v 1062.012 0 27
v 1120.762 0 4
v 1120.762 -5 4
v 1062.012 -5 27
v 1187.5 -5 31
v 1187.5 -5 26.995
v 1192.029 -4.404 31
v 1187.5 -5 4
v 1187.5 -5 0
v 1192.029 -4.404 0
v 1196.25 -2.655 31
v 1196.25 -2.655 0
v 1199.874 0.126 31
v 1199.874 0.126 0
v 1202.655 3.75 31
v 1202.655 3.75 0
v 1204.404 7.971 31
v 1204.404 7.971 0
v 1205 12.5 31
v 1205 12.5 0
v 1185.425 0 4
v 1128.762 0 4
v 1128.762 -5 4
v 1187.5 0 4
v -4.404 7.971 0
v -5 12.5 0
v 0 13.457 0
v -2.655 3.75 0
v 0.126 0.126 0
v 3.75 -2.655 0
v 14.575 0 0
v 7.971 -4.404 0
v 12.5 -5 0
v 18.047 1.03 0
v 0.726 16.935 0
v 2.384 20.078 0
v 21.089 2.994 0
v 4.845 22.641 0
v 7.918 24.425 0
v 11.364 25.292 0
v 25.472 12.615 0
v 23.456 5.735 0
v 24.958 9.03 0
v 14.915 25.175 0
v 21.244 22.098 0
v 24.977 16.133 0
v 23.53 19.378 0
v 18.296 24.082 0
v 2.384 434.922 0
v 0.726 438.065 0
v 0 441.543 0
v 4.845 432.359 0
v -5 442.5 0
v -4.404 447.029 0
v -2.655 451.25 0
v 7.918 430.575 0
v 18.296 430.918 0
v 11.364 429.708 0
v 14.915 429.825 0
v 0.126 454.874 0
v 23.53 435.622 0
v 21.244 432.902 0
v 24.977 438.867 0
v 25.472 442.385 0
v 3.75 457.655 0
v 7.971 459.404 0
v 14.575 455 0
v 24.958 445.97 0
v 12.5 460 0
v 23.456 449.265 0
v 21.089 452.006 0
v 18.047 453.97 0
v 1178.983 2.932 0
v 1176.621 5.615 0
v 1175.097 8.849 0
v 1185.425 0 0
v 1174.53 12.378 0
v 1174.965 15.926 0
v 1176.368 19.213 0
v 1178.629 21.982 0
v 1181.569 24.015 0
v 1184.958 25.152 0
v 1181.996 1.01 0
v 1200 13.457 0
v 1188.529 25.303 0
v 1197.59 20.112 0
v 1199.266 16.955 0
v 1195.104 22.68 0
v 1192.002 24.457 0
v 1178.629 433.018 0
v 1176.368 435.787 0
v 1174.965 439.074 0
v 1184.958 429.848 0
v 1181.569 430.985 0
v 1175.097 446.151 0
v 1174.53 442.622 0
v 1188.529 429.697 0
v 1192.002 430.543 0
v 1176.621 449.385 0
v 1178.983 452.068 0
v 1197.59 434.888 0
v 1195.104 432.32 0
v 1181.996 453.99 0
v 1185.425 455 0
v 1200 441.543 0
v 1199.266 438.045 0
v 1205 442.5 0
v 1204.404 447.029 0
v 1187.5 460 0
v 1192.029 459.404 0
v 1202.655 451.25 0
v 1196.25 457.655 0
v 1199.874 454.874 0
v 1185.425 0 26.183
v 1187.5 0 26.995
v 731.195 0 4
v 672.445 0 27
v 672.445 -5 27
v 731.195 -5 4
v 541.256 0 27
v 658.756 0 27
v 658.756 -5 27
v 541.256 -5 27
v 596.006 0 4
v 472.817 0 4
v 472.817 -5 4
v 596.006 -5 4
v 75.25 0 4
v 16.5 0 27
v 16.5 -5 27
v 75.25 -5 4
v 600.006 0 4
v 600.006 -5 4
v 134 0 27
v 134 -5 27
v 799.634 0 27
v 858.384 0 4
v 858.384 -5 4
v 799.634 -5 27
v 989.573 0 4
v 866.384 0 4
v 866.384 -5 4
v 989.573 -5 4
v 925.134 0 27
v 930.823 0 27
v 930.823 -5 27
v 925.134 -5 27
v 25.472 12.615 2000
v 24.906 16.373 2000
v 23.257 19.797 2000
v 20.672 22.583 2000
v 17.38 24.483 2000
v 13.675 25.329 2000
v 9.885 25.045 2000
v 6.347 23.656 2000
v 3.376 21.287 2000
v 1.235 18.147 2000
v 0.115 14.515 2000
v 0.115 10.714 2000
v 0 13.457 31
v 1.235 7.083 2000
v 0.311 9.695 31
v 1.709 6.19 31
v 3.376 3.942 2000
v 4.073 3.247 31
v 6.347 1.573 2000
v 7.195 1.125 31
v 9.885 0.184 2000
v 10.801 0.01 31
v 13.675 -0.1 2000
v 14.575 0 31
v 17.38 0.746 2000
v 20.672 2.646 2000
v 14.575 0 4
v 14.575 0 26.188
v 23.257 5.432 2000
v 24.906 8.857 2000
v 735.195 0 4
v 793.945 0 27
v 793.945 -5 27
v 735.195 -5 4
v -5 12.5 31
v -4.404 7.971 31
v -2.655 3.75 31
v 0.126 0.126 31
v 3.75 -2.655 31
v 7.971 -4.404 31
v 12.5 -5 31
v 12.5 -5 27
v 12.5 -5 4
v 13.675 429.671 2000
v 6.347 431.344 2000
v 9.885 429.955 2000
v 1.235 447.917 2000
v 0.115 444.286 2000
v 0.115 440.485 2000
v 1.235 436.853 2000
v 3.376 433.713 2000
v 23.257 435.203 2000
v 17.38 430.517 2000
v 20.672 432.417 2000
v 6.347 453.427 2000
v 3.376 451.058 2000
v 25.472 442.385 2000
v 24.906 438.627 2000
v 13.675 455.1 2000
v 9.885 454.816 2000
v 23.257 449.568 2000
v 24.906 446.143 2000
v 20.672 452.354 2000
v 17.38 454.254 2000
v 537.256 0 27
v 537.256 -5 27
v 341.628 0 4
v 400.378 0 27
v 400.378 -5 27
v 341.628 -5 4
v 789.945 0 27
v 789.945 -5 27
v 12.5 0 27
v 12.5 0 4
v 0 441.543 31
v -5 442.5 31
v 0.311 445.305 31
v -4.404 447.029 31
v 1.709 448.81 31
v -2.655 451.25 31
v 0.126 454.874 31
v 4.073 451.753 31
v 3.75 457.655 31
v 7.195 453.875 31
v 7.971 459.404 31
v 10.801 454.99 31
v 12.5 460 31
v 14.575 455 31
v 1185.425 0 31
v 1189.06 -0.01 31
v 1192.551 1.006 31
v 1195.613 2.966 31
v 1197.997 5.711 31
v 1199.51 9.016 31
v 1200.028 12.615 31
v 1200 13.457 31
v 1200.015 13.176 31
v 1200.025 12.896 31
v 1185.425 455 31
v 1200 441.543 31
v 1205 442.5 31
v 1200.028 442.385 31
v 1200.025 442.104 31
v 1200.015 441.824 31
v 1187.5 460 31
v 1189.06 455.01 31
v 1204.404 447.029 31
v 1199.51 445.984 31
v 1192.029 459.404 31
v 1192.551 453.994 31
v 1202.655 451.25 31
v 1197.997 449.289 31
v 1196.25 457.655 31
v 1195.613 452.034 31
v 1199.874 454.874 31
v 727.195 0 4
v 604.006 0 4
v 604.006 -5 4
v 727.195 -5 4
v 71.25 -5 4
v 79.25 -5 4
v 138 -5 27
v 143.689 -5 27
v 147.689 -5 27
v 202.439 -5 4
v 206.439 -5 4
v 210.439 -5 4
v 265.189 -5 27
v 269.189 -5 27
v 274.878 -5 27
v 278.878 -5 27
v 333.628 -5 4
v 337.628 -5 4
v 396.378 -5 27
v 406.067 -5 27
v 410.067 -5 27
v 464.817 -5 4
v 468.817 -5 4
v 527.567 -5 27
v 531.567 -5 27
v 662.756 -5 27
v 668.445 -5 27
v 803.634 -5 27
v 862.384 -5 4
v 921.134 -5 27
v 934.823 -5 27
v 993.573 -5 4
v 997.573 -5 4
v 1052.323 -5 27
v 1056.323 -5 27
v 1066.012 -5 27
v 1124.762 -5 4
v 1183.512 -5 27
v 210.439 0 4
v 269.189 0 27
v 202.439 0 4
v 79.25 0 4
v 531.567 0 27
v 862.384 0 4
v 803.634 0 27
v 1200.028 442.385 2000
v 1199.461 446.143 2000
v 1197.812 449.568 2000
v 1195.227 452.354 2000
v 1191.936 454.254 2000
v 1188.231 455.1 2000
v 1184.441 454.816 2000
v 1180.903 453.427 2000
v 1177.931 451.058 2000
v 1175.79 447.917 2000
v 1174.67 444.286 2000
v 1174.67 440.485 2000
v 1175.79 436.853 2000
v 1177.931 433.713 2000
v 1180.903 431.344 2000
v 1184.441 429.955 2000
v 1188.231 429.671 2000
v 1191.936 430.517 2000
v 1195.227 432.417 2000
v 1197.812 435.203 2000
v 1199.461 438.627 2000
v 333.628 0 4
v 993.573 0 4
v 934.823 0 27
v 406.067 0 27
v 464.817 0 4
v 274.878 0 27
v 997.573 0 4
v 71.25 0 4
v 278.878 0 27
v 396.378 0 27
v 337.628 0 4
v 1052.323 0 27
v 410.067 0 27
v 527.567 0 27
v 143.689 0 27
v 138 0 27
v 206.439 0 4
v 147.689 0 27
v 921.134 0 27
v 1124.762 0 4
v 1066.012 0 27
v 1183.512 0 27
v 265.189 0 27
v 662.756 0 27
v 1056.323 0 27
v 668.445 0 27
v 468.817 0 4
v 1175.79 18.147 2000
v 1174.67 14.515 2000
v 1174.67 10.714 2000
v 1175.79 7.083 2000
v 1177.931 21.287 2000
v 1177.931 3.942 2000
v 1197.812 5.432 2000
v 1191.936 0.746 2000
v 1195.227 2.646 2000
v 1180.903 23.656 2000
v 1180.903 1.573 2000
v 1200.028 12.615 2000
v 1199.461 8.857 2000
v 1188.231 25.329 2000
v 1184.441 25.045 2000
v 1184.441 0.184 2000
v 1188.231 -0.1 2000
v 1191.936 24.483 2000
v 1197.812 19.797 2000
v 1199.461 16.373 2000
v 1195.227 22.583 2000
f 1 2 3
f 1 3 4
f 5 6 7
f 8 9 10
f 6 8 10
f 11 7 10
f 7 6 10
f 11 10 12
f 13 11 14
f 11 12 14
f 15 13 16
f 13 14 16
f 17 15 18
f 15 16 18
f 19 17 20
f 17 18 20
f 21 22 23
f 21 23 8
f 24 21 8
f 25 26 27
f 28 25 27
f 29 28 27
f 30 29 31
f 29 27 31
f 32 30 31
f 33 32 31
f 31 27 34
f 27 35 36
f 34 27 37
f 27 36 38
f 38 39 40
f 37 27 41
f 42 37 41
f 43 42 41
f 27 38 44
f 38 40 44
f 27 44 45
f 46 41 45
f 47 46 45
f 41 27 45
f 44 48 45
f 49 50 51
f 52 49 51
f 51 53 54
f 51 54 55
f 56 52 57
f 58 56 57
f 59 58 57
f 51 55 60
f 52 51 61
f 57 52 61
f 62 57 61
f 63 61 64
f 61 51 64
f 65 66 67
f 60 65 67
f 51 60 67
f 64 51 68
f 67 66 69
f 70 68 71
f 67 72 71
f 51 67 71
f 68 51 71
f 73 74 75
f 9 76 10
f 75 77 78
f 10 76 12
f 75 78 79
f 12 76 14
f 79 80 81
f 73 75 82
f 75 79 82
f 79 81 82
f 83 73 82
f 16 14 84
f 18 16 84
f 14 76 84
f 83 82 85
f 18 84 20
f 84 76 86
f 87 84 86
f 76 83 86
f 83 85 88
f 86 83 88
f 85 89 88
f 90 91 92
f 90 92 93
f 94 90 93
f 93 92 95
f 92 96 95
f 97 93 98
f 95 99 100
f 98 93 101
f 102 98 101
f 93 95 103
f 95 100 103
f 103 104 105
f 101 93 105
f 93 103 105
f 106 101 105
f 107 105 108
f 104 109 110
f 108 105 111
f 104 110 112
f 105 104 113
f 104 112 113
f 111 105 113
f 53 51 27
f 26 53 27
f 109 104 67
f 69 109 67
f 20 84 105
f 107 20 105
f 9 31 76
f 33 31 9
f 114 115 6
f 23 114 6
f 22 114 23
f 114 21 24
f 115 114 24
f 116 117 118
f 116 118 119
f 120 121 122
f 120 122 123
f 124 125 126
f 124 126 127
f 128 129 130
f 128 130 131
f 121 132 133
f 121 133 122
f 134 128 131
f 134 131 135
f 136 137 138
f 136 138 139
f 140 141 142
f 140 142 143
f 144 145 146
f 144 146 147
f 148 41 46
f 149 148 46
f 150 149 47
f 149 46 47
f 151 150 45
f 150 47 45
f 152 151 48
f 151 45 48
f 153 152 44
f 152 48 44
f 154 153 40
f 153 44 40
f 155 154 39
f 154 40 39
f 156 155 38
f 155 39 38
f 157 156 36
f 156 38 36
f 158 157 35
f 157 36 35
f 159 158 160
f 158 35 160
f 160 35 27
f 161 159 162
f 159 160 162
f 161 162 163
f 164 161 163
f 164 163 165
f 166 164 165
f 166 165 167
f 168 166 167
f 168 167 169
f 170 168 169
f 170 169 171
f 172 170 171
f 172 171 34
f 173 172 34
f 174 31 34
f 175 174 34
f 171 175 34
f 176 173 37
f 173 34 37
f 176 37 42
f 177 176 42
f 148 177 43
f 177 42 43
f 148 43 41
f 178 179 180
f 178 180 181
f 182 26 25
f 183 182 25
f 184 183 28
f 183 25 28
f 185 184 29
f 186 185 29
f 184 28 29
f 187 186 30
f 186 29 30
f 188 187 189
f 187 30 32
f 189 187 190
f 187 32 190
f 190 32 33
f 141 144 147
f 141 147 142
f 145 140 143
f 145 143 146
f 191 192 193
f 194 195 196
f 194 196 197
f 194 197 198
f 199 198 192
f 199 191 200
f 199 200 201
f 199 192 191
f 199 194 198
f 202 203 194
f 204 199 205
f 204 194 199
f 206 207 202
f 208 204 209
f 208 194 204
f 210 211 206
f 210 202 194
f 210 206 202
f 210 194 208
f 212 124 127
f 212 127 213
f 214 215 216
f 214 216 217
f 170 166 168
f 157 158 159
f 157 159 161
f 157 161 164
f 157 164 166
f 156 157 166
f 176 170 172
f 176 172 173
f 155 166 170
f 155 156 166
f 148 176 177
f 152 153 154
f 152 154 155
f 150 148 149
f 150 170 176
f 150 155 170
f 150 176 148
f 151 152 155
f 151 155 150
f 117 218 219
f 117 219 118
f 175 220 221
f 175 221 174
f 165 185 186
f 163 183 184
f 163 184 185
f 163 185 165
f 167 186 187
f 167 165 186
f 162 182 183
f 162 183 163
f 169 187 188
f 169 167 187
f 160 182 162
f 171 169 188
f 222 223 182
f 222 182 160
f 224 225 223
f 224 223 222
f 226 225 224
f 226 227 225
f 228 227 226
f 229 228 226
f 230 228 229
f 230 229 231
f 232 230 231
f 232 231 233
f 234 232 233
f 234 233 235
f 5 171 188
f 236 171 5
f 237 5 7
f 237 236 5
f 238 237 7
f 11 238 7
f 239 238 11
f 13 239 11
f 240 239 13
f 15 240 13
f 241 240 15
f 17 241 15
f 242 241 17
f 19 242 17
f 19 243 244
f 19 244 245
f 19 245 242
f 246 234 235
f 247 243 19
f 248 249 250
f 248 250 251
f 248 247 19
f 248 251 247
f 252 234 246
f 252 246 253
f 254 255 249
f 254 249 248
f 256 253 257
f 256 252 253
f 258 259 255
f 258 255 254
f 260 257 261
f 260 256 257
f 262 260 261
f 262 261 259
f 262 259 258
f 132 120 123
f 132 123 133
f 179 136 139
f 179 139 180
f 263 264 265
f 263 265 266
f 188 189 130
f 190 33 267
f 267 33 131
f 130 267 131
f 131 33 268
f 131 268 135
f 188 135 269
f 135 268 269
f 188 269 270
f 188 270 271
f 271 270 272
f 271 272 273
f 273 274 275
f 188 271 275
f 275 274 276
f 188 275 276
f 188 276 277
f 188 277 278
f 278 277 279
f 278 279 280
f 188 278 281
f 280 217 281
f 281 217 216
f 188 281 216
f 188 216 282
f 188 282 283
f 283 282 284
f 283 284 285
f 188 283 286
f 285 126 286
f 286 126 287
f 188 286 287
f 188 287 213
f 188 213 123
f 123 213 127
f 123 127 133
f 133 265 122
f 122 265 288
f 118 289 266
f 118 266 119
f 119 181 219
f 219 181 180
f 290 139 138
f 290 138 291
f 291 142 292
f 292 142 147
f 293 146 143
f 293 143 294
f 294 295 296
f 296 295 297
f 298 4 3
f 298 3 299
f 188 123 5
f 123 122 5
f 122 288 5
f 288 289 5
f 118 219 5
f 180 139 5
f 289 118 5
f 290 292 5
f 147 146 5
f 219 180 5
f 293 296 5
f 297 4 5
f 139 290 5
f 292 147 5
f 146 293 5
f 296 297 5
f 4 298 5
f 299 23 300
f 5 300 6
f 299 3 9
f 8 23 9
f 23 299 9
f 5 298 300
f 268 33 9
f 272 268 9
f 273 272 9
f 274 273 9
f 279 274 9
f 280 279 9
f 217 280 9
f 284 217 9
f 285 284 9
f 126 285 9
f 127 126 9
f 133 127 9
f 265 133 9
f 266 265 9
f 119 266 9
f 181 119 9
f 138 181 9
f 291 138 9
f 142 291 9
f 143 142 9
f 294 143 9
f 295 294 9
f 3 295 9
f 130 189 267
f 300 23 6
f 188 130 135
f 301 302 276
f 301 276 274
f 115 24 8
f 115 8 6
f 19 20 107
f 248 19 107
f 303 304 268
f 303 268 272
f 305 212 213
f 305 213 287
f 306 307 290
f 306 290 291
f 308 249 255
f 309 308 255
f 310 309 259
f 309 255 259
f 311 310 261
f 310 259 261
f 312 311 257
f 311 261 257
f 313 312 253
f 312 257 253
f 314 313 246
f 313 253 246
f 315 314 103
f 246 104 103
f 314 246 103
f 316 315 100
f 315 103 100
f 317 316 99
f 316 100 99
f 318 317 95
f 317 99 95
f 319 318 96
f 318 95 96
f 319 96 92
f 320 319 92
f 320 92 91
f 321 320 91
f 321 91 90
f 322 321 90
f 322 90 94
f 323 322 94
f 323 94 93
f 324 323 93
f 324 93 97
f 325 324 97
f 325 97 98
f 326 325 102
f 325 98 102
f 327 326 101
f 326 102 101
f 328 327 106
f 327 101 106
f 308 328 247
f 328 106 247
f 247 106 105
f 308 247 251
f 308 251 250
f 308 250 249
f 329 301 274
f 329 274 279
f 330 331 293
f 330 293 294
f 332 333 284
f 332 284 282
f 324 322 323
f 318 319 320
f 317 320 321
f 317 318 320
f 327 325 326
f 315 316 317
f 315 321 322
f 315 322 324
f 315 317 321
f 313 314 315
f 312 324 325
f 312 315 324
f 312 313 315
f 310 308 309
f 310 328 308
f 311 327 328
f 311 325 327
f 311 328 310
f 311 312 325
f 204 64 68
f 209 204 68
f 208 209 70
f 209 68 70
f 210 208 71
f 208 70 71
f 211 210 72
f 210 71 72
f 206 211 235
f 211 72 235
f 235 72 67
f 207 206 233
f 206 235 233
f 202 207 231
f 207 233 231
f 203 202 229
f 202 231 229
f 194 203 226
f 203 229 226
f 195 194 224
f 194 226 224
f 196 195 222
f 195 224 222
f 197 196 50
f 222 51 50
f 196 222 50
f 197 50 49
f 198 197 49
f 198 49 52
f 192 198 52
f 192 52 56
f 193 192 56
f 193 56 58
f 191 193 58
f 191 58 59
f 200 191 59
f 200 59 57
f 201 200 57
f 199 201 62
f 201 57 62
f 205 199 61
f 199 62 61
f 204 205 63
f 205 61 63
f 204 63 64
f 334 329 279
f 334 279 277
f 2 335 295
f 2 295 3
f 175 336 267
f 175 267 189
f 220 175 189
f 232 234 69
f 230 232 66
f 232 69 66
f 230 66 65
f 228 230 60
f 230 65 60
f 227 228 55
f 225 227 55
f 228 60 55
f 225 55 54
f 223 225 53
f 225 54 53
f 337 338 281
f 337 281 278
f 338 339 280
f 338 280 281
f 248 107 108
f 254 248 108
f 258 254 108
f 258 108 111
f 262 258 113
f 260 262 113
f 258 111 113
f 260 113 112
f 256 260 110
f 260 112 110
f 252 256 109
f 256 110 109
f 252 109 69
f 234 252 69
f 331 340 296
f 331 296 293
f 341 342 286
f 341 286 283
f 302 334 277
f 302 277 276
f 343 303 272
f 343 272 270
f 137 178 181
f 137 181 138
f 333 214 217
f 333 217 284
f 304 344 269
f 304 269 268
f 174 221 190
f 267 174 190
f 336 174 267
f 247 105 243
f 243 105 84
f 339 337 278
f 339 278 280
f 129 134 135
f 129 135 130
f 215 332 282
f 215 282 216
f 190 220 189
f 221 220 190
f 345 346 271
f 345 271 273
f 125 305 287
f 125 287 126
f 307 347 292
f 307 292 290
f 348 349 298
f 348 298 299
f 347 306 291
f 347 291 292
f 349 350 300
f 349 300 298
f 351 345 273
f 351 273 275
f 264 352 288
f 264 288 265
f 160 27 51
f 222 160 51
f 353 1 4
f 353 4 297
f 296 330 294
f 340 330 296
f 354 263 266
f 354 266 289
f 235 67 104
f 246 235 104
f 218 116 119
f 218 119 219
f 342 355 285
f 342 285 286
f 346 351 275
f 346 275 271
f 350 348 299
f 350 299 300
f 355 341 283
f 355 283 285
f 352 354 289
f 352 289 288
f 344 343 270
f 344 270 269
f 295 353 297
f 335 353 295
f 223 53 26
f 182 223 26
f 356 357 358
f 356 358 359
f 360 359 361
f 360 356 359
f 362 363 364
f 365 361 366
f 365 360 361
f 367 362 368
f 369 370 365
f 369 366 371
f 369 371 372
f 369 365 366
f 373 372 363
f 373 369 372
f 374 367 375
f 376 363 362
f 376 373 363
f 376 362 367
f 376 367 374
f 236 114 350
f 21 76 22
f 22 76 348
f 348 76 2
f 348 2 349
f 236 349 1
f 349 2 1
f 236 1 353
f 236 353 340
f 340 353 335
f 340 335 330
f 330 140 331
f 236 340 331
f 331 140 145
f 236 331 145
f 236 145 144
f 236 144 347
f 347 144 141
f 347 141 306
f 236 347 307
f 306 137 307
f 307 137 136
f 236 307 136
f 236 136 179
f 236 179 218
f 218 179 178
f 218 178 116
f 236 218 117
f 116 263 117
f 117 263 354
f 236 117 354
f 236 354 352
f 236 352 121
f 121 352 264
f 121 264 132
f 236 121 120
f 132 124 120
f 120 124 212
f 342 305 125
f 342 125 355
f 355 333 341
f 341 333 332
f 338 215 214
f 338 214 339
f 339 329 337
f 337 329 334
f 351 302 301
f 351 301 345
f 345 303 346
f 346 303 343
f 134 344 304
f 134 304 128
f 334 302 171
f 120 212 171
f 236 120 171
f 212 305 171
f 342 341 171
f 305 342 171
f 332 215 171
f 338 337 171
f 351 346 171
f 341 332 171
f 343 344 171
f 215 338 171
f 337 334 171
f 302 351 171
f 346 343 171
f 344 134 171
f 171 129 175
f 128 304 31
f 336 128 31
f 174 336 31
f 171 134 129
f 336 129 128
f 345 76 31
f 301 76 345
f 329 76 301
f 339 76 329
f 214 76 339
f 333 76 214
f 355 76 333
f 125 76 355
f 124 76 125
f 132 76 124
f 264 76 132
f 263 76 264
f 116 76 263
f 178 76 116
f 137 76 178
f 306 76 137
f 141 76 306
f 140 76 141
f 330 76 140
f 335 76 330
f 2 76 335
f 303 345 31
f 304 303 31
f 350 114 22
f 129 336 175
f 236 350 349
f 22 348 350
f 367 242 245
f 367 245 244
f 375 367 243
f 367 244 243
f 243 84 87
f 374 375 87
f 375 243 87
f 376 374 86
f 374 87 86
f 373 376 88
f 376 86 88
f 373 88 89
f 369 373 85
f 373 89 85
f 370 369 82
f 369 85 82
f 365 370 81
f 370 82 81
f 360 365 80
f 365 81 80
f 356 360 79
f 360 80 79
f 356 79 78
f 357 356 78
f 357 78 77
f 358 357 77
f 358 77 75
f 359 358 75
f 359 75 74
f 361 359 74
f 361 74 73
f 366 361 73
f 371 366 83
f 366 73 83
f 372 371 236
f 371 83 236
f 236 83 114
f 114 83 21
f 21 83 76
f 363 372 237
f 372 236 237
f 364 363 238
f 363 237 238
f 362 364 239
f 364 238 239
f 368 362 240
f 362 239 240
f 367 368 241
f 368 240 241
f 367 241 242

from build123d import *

# Parameters (mm, degrees)
F1_DEPTH = 31
F2_R     = 12.75
F3_DEPTH = 2000
F5_DEPTH = 25


# Not quite as in the source:
# - ends of sketch curves that miss each other by under 0.0002 mm in the source are joined


with BuildPart() as f1:
    # F0 (on Top) → F1 (new body)
    with BuildSketch(Plane.XY):
        with BuildLine():
            Line((-4.9999998882, 442.5), (-4.9999998882, 12.5))
            ThreePointArc((-4.9999998882, 12.5), (0.1256313292, 0.1256313292), (12.5, -5))
            Line((12.5, -5), (1187.5, -5))
            ThreePointArc((1187.5, -5), (1199.8743686708, 0.1256313292), (1205, 12.5))
            Line((1205, 12.5), (1205, 442.5))
            ThreePointArc((1205, 442.5), (1199.8743686708, 454.8743686708), (1187.5, 460))
            Line((1187.5, 460), (12.5, 460.0000083447))
            ThreePointArc((12.5, 460.0000083447), (0.1256313292, 454.8743686708), (-4.9999998882, 442.5))
        make_face()
        with BuildLine():
            Line((1187.5, 0), (12.5, 0))
            ThreePointArc((12.5, 0), (3.6611652352, 3.6611652352), (0, 12.5))
            Line((0, 12.5), (0, 442.5))
            ThreePointArc((0, 442.5), (3.6611652352, 451.3388347648), (12.5, 455))
            Line((12.5, 455), (1187.5, 455))
            ThreePointArc((1187.5, 455), (1196.3388347648, 451.3388347648), (1200, 442.5))
            Line((1200, 442.5), (1200, 12.5))
            ThreePointArc((1200, 12.5), (1196.3388347648, 3.6611652352), (1187.5, 0))
        make_face(mode=Mode.SUBTRACT)
    extrude(amount=F1_DEPTH)

    # F2 (on Top) → F3 (join)
    with BuildSketch(Plane.XY):
        with Locations((12.7221517224, 12.6146673983)):
            Circle(F2_R)
        with Locations((12.7221517224, 442.3853326017)):
            Circle(F2_R)
        with Locations((1187.2778482776, 442.3853326017)):
            Circle(F2_R)
        with Locations((1187.2778482776, 12.6146673983)):
            Circle(F2_R)
    extrude(amount=F3_DEPTH)

    # F4 (on Front) → F5 (cut)
    with BuildSketch(Plane.XZ):
        Polygon((1187.5, 26.9953021277), (1128.762, 4), (1187.5, 4), align=None)
        Polygon((1066.012, 27), (1124.762, 4), (1183.512, 27), align=None)
        Polygon((1056.323, 27), (997.573, 4), (1120.762, 4), (1062.012, 27), align=None)
        Polygon((934.823, 27), (993.573, 4), (1052.323, 27), align=None)
        Polygon((925.134, 27), (866.384, 4), (989.573, 4), (930.823, 27), align=None)
        Polygon((803.634, 27), (862.384, 4), (921.134, 27), align=None)
        Polygon((793.945, 27), (735.195, 4), (858.384, 4), (799.634, 27), align=None)
        Polygon((672.445, 27), (731.195, 4), (789.945, 27), align=None)
        Polygon((662.756, 27), (604.006, 4), (727.195, 4), (668.445, 27), align=None)
        Polygon((541.256, 27), (600.006, 4), (658.756, 27), align=None)
        Polygon((531.567, 27), (472.817, 4), (596.006, 4), (537.256, 27), align=None)
        Polygon((410.067, 27), (468.817, 4), (527.567, 27), align=None)
        Polygon((400.378, 27), (341.628, 4), (464.817, 4), (406.067, 27), align=None)
        Polygon((278.878, 27), (337.628, 4), (396.378, 27), align=None)
        Polygon((269.189, 27), (210.439, 4), (333.628, 4), (274.878, 27), align=None)
        Polygon((265.189, 27), (147.689, 27), (206.439, 4), align=None)
        Polygon((143.689, 27), (138, 27), (79.25, 4), (202.439, 4), align=None)
        Polygon((134, 27), (16.5, 27), (75.25, 4), align=None)
        Polygon((71.25, 4), (12.5, 27), (12.5, 4), align=None)
    extrude(amount=F5_DEPTH, mode=Mode.SUBTRACT)


solid = f1.part
